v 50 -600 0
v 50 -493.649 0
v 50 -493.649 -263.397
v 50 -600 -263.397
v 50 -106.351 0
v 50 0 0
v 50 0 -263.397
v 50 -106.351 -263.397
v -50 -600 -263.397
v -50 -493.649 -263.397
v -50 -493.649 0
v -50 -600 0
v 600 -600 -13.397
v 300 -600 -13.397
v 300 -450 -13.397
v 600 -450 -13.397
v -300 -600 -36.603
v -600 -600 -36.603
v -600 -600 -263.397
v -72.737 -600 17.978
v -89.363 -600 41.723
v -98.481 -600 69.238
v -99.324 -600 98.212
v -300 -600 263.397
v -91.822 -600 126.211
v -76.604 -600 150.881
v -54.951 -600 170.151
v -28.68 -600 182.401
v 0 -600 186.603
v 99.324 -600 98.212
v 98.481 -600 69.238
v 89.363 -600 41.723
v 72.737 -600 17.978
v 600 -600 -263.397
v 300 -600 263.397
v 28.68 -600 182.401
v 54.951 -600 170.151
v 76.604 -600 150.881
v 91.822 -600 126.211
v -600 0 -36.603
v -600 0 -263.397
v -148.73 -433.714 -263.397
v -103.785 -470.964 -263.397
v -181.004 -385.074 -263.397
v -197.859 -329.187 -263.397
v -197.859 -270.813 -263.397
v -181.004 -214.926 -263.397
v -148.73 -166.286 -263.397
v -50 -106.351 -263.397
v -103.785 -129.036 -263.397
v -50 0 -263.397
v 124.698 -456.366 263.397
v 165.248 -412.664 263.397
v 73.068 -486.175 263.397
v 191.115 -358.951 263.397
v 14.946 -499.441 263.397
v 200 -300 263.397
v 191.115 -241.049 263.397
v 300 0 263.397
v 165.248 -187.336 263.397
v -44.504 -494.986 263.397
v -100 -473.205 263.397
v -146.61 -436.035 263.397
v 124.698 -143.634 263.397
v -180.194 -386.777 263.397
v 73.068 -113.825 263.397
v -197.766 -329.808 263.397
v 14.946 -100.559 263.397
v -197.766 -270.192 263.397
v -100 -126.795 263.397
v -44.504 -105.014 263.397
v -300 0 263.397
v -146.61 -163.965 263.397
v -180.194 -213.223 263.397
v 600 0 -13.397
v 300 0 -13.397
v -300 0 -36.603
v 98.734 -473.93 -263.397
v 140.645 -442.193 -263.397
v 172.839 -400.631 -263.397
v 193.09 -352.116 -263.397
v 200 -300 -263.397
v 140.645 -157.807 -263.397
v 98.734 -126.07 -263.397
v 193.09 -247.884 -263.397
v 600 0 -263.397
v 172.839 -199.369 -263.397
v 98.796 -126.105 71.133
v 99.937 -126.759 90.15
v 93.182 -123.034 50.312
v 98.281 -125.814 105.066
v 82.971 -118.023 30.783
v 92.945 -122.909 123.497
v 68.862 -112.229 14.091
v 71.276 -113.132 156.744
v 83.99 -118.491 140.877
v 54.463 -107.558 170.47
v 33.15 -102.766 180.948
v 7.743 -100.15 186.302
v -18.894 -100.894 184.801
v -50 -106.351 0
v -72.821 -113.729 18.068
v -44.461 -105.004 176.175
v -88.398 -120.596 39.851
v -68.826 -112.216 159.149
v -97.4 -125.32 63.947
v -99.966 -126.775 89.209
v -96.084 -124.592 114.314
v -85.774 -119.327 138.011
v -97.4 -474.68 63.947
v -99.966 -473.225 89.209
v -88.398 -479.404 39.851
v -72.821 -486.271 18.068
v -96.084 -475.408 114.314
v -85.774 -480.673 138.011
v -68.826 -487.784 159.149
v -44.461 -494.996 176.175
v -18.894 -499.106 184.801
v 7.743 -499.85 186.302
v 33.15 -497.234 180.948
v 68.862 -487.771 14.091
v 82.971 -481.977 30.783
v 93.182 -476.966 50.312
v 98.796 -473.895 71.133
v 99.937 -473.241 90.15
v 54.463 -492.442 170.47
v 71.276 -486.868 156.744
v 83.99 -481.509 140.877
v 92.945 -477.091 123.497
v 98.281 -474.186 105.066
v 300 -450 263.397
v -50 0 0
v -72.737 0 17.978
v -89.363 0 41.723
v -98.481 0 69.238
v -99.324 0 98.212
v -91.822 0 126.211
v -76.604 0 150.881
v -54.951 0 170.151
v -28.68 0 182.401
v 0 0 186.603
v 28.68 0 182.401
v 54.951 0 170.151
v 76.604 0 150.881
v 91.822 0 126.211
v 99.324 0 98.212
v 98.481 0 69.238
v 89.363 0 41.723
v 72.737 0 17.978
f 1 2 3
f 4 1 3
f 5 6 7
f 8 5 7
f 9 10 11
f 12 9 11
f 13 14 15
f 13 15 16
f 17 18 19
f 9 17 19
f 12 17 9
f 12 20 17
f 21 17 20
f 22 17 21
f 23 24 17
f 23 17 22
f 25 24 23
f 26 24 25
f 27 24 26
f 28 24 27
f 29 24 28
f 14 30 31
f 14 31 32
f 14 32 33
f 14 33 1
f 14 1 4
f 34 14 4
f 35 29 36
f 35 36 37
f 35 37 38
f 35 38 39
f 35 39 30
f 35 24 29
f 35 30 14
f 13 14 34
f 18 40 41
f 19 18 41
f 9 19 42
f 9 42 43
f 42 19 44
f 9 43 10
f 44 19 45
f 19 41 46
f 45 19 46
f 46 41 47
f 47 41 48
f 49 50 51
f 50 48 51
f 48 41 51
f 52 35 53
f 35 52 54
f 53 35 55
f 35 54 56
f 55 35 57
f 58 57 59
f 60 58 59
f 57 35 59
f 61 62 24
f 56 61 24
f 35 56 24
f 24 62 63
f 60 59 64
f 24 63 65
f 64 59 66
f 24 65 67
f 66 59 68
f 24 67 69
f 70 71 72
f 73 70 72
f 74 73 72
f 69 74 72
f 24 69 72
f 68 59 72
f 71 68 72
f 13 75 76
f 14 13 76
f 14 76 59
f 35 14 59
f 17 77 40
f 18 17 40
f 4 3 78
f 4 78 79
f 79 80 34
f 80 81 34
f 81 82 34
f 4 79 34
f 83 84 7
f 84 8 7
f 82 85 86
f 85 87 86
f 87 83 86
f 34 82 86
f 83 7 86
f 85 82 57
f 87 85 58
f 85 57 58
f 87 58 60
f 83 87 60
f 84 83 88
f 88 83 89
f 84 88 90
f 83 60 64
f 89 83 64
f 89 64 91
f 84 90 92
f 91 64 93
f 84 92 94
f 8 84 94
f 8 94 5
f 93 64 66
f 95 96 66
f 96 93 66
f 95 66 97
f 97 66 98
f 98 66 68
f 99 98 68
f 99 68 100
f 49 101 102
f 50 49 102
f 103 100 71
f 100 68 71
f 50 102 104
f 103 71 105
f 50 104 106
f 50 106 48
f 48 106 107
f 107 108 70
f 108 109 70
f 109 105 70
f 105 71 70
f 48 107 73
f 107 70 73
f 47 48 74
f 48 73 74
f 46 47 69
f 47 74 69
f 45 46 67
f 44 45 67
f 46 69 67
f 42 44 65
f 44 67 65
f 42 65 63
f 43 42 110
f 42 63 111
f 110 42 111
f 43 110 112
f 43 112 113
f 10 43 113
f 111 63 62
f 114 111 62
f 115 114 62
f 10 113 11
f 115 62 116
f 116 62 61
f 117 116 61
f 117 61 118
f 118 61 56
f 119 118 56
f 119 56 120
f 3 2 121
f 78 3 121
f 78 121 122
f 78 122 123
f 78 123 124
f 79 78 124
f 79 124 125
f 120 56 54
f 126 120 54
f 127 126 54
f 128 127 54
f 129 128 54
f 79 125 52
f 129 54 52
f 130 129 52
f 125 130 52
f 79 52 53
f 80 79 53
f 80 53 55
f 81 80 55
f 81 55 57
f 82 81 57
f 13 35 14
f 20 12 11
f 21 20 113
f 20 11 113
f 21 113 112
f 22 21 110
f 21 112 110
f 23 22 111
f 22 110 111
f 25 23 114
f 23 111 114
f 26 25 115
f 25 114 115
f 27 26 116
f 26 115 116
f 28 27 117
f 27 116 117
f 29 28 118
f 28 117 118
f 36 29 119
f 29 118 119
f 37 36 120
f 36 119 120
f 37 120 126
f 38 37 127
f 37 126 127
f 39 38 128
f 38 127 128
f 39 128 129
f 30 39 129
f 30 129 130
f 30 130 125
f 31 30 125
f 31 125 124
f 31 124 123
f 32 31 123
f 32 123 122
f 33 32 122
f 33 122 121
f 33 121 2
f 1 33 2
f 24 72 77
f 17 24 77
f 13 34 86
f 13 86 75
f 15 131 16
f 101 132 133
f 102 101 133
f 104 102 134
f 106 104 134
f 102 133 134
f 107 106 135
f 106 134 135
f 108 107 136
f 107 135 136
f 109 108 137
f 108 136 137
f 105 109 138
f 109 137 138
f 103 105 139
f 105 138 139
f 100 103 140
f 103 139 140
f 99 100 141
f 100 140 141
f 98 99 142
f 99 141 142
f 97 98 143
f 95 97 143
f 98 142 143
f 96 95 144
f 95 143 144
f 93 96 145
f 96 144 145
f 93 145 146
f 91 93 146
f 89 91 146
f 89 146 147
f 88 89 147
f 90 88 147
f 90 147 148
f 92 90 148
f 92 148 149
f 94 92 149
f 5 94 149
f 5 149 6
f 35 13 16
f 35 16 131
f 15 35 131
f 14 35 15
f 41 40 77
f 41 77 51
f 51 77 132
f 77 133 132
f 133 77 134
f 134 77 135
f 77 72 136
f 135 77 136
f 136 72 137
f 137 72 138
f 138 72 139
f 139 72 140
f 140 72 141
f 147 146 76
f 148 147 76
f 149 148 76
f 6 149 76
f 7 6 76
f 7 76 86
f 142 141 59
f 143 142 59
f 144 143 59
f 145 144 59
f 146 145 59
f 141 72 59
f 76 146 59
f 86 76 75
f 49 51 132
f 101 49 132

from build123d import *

# Parameters (mm, degrees)
F1_DEPTH = 600
F2_R     = 200
F3_DEPTH = 526.795919
F5_DEPTH = 150


with BuildPart() as f1:
    # F0 (on Front) → F1 (new body)
    with BuildSketch(Plane.XZ):
        with BuildLine():
            Line((300, -13.39746), (300, 263.39746))
            Line((300, 263.39746), (-300, 263.39746))
            Line((-300, 263.39746), (-300, -36.60254))
            Line((-300, -36.60254), (-600, -36.60254))
            Line((-600, -36.60254), (-600, -263.39746))
            Line((-600, -263.39746), (-50, -263.39746))
            Line((-50, -263.39746), (-50, 0))
            ThreePointArc((-50, 0), (0, 186.60254), (50, 0))
            Line((50, 0), (50, -263.39746))
            Line((50, -263.39746), (600, -263.39746))
            Line((600, -263.39746), (600, -13.39746))
            Line((600, -13.39746), (300, -13.39746))
        make_face()
    extrude(amount=F1_DEPTH)

    # F2 (on face) → F3 (cut, through all)
    with BuildSketch(Plane.XY.offset(263.39746)):
        with Locations((0, -300)):
            Circle(F2_R)
    extrude(amount=-F3_DEPTH, mode=Mode.SUBTRACT)


with BuildPart() as f5:
    # F4 (on face) → F5 (new body)
    with BuildSketch(Plane.XZ.offset(600)):
        Polygon((600, -13.39746), (300, 263.39746), (300, -13.39746), align=None)
    extrude(amount=-F5_DEPTH)


solid = Compound([f1.part, f5.part])
